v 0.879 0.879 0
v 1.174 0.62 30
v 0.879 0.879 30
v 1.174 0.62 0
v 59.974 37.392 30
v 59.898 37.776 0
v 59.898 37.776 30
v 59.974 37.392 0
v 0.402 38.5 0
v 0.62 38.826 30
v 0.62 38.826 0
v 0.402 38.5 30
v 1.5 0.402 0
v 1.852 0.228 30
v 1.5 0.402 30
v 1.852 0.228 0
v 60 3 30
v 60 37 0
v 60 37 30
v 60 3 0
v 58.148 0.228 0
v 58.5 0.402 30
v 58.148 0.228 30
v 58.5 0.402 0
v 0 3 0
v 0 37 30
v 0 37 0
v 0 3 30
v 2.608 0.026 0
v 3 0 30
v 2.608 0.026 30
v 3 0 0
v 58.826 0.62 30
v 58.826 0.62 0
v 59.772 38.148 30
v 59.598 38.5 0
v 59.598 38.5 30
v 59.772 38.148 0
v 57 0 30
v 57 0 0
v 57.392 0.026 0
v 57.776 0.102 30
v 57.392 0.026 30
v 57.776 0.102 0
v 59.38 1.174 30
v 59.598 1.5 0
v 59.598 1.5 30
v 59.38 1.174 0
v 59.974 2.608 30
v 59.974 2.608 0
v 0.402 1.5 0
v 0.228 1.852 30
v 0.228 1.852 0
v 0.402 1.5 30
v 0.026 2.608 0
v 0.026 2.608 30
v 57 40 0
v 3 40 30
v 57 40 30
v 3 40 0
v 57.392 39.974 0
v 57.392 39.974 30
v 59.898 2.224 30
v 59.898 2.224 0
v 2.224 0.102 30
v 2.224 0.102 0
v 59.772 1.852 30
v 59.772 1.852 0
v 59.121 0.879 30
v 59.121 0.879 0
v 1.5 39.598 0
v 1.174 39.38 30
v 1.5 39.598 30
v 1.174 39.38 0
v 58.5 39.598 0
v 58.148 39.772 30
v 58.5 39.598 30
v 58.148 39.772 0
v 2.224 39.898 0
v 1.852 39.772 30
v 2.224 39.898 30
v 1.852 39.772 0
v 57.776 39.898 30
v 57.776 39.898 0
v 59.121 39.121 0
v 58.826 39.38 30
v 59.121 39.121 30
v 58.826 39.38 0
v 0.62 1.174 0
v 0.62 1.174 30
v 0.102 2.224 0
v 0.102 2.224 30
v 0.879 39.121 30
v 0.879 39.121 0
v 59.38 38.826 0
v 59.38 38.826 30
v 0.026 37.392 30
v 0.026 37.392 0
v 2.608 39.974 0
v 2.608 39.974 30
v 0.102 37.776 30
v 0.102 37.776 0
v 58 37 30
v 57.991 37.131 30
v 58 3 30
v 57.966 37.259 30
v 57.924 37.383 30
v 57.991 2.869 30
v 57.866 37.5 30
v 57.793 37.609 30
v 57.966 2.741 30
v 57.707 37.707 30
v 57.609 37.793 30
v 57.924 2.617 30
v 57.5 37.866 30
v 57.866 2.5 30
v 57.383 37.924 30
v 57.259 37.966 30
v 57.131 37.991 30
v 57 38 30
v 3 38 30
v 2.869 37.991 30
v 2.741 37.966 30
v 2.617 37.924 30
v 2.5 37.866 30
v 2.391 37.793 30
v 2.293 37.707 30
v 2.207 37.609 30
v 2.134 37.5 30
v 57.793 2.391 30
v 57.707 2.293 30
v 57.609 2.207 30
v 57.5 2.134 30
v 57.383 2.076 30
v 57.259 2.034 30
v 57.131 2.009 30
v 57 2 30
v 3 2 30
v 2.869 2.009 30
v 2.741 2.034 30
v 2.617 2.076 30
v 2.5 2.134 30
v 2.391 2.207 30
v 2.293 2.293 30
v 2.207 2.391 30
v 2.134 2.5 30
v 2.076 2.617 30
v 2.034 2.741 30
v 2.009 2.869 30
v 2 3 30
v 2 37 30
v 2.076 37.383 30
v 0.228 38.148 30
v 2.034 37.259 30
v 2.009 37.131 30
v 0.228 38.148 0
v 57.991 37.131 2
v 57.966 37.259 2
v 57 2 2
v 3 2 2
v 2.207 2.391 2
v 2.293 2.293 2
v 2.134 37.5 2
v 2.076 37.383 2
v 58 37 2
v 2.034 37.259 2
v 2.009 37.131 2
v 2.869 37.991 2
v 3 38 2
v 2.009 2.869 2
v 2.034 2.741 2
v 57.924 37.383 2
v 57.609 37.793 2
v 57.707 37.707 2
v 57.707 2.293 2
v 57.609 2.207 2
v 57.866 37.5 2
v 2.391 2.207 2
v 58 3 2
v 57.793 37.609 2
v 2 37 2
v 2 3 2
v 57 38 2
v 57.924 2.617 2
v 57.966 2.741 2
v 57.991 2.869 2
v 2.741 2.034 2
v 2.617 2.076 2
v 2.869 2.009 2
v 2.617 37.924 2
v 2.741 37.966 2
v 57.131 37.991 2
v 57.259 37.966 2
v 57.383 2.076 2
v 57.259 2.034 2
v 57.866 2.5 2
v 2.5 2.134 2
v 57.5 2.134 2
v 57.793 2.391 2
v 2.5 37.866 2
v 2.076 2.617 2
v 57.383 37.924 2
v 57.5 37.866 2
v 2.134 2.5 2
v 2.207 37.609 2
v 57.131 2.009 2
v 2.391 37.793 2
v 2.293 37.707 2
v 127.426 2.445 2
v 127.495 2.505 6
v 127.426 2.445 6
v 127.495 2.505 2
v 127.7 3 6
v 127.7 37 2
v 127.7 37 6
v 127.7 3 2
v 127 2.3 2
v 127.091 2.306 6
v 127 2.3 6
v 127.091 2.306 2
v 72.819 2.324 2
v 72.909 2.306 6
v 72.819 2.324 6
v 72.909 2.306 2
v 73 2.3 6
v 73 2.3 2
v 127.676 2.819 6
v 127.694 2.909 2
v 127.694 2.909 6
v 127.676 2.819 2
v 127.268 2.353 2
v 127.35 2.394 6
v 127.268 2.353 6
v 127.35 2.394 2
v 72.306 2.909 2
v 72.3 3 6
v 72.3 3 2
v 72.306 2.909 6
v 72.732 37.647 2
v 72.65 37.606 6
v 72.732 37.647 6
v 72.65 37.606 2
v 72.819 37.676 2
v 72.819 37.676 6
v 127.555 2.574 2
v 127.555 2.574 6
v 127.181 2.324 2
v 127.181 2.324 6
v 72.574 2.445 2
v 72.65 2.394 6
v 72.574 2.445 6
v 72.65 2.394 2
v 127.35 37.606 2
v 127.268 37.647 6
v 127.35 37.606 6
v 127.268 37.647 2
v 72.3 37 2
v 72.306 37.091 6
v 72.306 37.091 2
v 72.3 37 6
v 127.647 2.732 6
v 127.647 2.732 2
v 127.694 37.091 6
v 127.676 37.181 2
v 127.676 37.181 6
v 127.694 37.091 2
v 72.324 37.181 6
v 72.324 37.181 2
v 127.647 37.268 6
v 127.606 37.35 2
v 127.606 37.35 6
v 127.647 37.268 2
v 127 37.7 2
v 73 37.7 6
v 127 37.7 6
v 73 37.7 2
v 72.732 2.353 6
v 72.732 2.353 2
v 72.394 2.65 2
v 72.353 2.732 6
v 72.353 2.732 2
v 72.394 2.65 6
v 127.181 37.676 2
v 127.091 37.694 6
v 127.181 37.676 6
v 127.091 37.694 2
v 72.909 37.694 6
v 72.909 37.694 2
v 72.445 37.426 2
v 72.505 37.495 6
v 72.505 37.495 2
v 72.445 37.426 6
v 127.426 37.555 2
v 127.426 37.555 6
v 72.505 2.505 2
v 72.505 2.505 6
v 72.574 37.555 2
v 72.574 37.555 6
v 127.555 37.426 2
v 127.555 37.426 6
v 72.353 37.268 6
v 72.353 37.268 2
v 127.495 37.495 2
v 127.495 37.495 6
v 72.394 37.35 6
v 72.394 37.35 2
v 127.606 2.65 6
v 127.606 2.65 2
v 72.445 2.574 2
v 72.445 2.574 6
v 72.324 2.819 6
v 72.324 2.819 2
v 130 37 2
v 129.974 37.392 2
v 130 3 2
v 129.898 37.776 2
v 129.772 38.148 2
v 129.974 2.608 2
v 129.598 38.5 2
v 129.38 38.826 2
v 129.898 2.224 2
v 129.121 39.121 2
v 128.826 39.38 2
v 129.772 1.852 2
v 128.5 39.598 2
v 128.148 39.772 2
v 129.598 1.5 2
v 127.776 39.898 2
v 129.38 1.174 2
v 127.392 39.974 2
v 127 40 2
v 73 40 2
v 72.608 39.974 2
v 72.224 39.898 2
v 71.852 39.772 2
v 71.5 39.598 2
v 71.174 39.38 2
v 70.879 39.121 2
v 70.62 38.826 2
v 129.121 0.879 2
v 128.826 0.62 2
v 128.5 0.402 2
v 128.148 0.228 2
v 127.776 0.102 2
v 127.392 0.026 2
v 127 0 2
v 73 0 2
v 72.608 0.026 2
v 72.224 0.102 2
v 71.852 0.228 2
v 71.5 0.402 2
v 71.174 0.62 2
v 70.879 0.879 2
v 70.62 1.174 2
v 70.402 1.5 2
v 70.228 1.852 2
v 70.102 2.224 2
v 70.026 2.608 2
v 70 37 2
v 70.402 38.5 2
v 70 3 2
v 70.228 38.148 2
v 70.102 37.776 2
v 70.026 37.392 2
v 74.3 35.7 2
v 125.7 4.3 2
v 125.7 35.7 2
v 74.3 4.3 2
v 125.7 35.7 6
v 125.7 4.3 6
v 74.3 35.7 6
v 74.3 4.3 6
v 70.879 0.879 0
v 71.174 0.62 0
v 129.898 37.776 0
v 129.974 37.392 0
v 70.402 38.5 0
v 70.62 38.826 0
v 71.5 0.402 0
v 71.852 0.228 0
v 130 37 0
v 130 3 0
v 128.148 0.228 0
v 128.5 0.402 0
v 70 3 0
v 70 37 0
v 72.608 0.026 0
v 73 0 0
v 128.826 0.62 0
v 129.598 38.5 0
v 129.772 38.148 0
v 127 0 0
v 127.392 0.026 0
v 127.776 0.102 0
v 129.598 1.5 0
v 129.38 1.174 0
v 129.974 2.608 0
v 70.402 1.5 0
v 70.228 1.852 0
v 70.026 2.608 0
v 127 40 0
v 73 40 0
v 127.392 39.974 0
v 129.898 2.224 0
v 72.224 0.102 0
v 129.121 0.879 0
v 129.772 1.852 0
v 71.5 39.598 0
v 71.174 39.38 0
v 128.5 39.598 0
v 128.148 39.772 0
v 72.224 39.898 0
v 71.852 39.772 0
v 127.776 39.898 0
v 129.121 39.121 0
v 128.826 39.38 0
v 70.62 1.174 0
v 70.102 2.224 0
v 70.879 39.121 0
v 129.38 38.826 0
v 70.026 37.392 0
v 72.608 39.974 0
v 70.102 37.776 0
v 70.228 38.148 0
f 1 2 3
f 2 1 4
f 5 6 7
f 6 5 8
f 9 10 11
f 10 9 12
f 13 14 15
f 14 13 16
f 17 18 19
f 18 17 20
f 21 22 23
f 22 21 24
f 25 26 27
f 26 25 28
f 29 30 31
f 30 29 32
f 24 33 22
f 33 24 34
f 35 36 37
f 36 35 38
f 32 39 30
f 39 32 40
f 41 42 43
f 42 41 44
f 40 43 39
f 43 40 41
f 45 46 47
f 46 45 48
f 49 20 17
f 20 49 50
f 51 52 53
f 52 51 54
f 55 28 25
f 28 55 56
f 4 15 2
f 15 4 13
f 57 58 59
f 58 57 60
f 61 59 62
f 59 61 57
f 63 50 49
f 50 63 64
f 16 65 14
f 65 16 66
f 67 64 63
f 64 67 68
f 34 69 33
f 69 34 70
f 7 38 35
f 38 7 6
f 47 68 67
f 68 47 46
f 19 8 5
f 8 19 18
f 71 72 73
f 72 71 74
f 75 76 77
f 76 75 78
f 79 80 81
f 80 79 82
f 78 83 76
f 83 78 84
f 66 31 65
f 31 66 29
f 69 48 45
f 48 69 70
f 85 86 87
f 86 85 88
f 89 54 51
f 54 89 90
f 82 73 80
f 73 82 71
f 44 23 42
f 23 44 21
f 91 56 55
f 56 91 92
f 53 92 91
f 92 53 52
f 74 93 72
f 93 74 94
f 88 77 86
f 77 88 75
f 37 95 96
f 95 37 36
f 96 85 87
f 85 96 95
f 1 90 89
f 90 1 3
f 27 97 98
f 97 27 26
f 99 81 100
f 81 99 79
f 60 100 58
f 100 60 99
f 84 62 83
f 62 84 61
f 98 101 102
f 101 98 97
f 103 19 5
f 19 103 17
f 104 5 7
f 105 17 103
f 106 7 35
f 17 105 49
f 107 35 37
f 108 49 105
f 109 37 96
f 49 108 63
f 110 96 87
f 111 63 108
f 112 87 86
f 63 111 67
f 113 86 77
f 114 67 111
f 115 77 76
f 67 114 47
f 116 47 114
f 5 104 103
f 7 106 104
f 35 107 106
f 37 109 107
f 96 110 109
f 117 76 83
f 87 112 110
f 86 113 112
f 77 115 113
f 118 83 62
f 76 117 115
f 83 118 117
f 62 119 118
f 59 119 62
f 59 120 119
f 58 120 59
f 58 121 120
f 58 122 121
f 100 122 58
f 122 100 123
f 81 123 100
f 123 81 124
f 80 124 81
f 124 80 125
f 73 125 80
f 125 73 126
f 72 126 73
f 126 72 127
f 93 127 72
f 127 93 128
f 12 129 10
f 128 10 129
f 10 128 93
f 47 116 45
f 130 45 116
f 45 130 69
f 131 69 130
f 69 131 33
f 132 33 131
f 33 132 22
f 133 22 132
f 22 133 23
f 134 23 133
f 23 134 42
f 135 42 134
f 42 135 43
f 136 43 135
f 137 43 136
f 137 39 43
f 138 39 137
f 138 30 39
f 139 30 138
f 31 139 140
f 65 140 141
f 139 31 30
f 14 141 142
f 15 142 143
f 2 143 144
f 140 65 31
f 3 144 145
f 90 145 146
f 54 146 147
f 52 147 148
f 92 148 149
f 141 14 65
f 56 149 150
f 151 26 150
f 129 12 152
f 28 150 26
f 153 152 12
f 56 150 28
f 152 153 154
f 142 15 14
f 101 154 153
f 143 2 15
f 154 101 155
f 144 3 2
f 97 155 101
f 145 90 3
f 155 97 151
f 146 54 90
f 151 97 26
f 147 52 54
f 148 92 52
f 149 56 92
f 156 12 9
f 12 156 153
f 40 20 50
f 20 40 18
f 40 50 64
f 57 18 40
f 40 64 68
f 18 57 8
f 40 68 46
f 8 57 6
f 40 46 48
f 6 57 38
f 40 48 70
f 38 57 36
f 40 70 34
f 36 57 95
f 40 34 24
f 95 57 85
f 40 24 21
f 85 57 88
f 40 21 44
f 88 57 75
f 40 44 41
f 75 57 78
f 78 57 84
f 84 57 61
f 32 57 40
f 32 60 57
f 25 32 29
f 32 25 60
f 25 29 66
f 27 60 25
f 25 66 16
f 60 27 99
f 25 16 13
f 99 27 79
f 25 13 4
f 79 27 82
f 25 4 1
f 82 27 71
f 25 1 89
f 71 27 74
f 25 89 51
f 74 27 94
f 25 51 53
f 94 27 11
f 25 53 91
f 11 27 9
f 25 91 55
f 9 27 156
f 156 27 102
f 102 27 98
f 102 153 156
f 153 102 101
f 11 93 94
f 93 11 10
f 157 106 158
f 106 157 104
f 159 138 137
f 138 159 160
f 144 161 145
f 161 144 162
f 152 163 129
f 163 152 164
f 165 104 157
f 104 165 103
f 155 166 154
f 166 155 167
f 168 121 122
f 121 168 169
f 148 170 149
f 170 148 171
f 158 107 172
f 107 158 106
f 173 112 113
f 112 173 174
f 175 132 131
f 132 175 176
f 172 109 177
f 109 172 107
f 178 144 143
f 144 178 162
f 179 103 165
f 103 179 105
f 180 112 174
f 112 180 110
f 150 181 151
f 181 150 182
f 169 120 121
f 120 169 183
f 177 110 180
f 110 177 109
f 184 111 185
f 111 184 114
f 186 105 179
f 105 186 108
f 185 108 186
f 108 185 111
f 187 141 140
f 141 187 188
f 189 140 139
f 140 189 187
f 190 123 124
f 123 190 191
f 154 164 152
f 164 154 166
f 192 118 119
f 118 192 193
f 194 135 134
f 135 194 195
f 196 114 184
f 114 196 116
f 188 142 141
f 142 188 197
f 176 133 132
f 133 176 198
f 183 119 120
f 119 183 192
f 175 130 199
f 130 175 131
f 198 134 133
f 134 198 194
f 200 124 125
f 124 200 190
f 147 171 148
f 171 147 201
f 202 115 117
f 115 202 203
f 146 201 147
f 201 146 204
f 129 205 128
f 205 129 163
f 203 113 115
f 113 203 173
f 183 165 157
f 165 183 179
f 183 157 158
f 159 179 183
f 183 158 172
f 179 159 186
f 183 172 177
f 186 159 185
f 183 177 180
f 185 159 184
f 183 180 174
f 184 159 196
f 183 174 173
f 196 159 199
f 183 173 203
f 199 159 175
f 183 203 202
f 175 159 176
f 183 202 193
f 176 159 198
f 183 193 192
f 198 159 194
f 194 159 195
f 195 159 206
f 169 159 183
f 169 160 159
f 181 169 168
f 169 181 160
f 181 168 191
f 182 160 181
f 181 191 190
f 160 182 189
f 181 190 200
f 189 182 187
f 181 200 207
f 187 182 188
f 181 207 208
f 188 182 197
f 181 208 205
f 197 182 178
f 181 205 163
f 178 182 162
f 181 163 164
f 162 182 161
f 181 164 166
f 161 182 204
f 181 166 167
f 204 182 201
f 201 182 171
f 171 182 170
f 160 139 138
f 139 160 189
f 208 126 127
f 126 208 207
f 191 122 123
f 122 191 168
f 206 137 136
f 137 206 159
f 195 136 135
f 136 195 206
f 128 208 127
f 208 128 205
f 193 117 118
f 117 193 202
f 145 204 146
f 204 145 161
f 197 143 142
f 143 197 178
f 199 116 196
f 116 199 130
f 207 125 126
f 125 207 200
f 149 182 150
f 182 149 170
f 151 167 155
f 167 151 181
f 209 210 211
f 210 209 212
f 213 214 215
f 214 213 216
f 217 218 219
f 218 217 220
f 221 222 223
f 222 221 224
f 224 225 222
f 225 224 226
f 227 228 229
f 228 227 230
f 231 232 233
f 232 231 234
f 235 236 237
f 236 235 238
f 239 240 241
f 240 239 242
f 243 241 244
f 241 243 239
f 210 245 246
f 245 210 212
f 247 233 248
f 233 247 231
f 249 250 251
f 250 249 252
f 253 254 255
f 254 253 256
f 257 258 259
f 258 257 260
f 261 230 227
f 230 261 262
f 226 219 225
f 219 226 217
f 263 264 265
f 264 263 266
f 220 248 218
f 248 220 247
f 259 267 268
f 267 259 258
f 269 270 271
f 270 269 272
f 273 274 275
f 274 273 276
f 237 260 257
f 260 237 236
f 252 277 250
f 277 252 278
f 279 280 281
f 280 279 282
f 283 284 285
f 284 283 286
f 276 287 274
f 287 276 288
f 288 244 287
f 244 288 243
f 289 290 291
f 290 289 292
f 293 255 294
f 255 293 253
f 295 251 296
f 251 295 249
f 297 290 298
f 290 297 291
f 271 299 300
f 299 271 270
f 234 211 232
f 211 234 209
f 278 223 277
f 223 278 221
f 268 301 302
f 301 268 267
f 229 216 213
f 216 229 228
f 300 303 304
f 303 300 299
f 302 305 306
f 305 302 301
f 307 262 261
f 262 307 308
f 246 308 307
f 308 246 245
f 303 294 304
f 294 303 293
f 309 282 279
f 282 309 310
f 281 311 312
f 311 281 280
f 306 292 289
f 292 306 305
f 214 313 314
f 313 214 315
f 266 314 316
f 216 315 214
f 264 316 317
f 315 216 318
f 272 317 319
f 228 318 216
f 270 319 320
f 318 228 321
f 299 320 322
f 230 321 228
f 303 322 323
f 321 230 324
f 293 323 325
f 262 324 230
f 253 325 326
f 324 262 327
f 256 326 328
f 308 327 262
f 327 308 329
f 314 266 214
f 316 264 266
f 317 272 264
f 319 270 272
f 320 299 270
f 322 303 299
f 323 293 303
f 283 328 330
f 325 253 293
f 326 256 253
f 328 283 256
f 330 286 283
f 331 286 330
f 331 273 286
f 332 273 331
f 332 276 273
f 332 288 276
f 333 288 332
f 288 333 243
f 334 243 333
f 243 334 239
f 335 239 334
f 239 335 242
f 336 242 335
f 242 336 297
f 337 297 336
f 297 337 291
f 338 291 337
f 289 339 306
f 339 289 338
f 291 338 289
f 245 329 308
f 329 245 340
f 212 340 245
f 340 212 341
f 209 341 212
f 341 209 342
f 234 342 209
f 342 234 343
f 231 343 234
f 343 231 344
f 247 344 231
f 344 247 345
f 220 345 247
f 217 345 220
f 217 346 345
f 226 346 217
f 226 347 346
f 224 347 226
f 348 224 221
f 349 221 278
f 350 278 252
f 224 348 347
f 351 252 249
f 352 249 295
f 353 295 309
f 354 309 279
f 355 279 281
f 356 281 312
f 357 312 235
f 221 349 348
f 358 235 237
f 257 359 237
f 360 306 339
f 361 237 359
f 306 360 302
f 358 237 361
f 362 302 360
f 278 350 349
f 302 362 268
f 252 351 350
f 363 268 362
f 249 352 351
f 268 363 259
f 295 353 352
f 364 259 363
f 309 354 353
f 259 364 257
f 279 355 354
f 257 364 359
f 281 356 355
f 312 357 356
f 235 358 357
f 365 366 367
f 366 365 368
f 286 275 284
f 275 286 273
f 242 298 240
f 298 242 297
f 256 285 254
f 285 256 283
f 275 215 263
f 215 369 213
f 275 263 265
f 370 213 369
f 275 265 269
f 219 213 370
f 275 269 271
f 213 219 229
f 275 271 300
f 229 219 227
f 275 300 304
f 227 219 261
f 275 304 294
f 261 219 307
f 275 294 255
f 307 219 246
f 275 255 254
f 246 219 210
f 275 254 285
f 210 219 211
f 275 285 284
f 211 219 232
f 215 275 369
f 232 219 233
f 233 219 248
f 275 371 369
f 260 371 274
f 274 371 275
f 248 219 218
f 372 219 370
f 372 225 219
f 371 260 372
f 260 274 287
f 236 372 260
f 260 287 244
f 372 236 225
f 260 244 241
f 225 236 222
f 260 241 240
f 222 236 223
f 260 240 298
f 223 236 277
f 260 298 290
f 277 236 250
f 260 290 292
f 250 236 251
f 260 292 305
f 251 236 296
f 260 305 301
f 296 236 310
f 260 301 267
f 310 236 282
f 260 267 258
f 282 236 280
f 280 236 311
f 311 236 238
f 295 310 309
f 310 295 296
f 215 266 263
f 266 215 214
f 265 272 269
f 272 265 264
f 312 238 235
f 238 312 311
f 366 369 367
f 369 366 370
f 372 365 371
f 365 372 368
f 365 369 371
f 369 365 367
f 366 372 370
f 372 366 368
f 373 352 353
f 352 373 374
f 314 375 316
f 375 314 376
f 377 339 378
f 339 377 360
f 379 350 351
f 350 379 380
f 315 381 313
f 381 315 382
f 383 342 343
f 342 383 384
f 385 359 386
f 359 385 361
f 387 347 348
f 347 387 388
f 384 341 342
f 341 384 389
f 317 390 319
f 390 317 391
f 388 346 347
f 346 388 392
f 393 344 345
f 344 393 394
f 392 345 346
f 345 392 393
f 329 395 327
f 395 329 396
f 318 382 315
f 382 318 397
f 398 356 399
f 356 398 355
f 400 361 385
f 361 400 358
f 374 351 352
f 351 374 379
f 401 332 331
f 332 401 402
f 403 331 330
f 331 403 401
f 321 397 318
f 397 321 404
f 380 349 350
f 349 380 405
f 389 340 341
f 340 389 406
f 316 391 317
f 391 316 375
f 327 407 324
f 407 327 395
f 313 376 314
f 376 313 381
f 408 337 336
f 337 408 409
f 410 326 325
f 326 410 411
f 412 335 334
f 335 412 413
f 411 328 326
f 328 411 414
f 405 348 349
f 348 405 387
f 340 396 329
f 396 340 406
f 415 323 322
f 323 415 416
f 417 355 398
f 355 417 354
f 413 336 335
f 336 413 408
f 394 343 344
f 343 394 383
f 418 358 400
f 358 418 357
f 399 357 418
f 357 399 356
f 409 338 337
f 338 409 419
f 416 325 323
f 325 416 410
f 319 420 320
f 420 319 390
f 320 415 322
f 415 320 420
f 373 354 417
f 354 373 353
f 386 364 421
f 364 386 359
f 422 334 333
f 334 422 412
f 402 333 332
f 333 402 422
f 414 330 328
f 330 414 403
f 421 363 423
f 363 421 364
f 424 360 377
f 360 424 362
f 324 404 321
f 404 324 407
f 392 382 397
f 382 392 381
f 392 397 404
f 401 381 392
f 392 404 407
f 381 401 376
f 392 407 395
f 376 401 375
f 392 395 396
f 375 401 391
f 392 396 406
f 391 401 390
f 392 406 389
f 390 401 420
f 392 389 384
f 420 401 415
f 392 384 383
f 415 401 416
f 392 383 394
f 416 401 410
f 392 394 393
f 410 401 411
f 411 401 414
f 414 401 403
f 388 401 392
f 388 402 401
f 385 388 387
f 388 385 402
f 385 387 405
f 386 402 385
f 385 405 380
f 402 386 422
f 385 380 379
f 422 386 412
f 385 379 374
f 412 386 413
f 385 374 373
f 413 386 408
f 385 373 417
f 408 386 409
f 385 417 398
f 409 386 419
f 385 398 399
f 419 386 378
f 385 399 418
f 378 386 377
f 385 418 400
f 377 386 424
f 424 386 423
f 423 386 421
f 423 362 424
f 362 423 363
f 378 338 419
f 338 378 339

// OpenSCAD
// Timmy starter: a parametric box with a lid (OpenSCAD).
//
// Run it from Timmy:   /scad box.scad                          the values in box.params.json
//                      /scad box.scad width=80 part="lid" --png
// Each value below is a parameter. box.params.json beside this file sets them for /scad, and
// name=value words given to /scad override that file. Lengths are millimetres by OpenSCAD's
// convention (an STL records no unit).

/* [Size] */
// outer width of the box (x)
width = 60;
// outer depth of the box (y)
depth = 40;
// outer height of the box, without its lid (z)
height = 30;
// wall and floor thickness
wall = 2;
// radius of the outside corners (0: square corners)
corner = 3;

/* [Lid] */
// thickness of the lid's top plate
lid_thickness = 2;
// how far the lid's lip reaches down into the box
lip_depth = 4;
// clearance between the lip and the box's inner wall, on each side
lid_gap = 0.3;

/* [Layout] */
// which part to make: "box", "lid" or "both" (side by side, the lid upside down, ready to print)
part = "both";
// space between the two parts when both are made
spacing = 10;

/* [Hidden] */
$fn = 48;

// A slab of size [x, y, z] from the origin, its vertical edges rounded with radius r.
module slab(size, r) {
  if (r <= 0) {
    cube(size);
  } else {
    hull() {
      for (x = [r, size[0] - r], y = [r, size[1] - r])
        translate([x, y, 0]) cylinder(r = r, h = size[2]);
    }
  }
}

// The box: an open-topped shell with walls and a floor of thickness `wall`.
module box() {
  difference() {
    slab([width, depth, height], corner);
    translate([wall, wall, wall])
      slab([width - 2 * wall, depth - 2 * wall, height], max(corner - wall, 0));
  }
}

// The lid: a plate the size of the box, with a hollow lip that drops into the box with
// `lid_gap` of clearance on every side. Made upside down: the plate on the bed, the lip up.
module lid() {
  lip_w = width - 2 * wall - 2 * lid_gap;
  lip_d = depth - 2 * wall - 2 * lid_gap;
  lip_r = max(corner - wall - lid_gap, 0);
  union() {
    slab([width, depth, lid_thickness], corner);
    translate([wall + lid_gap, wall + lid_gap, lid_thickness])
      difference() {
        slab([lip_w, lip_d, lip_depth], lip_r);
        translate([wall, wall, -1])
          slab([lip_w - 2 * wall, lip_d - 2 * wall, lip_depth + 2], max(lip_r - wall, 0));
      }
  }
}

assert(wall > 0 && lid_gap >= 0 && lid_thickness > 0 && lip_depth > 0, "wall, lid_thickness and lip_depth must be above 0, lid_gap 0 or more");
assert(width > 4 * wall + 2 * lid_gap && depth > 4 * wall + 2 * lid_gap, "the box is too small for its walls and the lid's lip");
assert(corner >= 0 && 2 * corner < min(width, depth), "corner must be 0 or more and less than half the smaller side");
assert(part == "box" || part == "lid" || part == "both", "part is \"box\", \"lid\" or \"both\"");

if (part == "box" || part == "both") box();
if (part == "lid") lid();
if (part == "both") translate([width + spacing, 0, 0]) lid();
